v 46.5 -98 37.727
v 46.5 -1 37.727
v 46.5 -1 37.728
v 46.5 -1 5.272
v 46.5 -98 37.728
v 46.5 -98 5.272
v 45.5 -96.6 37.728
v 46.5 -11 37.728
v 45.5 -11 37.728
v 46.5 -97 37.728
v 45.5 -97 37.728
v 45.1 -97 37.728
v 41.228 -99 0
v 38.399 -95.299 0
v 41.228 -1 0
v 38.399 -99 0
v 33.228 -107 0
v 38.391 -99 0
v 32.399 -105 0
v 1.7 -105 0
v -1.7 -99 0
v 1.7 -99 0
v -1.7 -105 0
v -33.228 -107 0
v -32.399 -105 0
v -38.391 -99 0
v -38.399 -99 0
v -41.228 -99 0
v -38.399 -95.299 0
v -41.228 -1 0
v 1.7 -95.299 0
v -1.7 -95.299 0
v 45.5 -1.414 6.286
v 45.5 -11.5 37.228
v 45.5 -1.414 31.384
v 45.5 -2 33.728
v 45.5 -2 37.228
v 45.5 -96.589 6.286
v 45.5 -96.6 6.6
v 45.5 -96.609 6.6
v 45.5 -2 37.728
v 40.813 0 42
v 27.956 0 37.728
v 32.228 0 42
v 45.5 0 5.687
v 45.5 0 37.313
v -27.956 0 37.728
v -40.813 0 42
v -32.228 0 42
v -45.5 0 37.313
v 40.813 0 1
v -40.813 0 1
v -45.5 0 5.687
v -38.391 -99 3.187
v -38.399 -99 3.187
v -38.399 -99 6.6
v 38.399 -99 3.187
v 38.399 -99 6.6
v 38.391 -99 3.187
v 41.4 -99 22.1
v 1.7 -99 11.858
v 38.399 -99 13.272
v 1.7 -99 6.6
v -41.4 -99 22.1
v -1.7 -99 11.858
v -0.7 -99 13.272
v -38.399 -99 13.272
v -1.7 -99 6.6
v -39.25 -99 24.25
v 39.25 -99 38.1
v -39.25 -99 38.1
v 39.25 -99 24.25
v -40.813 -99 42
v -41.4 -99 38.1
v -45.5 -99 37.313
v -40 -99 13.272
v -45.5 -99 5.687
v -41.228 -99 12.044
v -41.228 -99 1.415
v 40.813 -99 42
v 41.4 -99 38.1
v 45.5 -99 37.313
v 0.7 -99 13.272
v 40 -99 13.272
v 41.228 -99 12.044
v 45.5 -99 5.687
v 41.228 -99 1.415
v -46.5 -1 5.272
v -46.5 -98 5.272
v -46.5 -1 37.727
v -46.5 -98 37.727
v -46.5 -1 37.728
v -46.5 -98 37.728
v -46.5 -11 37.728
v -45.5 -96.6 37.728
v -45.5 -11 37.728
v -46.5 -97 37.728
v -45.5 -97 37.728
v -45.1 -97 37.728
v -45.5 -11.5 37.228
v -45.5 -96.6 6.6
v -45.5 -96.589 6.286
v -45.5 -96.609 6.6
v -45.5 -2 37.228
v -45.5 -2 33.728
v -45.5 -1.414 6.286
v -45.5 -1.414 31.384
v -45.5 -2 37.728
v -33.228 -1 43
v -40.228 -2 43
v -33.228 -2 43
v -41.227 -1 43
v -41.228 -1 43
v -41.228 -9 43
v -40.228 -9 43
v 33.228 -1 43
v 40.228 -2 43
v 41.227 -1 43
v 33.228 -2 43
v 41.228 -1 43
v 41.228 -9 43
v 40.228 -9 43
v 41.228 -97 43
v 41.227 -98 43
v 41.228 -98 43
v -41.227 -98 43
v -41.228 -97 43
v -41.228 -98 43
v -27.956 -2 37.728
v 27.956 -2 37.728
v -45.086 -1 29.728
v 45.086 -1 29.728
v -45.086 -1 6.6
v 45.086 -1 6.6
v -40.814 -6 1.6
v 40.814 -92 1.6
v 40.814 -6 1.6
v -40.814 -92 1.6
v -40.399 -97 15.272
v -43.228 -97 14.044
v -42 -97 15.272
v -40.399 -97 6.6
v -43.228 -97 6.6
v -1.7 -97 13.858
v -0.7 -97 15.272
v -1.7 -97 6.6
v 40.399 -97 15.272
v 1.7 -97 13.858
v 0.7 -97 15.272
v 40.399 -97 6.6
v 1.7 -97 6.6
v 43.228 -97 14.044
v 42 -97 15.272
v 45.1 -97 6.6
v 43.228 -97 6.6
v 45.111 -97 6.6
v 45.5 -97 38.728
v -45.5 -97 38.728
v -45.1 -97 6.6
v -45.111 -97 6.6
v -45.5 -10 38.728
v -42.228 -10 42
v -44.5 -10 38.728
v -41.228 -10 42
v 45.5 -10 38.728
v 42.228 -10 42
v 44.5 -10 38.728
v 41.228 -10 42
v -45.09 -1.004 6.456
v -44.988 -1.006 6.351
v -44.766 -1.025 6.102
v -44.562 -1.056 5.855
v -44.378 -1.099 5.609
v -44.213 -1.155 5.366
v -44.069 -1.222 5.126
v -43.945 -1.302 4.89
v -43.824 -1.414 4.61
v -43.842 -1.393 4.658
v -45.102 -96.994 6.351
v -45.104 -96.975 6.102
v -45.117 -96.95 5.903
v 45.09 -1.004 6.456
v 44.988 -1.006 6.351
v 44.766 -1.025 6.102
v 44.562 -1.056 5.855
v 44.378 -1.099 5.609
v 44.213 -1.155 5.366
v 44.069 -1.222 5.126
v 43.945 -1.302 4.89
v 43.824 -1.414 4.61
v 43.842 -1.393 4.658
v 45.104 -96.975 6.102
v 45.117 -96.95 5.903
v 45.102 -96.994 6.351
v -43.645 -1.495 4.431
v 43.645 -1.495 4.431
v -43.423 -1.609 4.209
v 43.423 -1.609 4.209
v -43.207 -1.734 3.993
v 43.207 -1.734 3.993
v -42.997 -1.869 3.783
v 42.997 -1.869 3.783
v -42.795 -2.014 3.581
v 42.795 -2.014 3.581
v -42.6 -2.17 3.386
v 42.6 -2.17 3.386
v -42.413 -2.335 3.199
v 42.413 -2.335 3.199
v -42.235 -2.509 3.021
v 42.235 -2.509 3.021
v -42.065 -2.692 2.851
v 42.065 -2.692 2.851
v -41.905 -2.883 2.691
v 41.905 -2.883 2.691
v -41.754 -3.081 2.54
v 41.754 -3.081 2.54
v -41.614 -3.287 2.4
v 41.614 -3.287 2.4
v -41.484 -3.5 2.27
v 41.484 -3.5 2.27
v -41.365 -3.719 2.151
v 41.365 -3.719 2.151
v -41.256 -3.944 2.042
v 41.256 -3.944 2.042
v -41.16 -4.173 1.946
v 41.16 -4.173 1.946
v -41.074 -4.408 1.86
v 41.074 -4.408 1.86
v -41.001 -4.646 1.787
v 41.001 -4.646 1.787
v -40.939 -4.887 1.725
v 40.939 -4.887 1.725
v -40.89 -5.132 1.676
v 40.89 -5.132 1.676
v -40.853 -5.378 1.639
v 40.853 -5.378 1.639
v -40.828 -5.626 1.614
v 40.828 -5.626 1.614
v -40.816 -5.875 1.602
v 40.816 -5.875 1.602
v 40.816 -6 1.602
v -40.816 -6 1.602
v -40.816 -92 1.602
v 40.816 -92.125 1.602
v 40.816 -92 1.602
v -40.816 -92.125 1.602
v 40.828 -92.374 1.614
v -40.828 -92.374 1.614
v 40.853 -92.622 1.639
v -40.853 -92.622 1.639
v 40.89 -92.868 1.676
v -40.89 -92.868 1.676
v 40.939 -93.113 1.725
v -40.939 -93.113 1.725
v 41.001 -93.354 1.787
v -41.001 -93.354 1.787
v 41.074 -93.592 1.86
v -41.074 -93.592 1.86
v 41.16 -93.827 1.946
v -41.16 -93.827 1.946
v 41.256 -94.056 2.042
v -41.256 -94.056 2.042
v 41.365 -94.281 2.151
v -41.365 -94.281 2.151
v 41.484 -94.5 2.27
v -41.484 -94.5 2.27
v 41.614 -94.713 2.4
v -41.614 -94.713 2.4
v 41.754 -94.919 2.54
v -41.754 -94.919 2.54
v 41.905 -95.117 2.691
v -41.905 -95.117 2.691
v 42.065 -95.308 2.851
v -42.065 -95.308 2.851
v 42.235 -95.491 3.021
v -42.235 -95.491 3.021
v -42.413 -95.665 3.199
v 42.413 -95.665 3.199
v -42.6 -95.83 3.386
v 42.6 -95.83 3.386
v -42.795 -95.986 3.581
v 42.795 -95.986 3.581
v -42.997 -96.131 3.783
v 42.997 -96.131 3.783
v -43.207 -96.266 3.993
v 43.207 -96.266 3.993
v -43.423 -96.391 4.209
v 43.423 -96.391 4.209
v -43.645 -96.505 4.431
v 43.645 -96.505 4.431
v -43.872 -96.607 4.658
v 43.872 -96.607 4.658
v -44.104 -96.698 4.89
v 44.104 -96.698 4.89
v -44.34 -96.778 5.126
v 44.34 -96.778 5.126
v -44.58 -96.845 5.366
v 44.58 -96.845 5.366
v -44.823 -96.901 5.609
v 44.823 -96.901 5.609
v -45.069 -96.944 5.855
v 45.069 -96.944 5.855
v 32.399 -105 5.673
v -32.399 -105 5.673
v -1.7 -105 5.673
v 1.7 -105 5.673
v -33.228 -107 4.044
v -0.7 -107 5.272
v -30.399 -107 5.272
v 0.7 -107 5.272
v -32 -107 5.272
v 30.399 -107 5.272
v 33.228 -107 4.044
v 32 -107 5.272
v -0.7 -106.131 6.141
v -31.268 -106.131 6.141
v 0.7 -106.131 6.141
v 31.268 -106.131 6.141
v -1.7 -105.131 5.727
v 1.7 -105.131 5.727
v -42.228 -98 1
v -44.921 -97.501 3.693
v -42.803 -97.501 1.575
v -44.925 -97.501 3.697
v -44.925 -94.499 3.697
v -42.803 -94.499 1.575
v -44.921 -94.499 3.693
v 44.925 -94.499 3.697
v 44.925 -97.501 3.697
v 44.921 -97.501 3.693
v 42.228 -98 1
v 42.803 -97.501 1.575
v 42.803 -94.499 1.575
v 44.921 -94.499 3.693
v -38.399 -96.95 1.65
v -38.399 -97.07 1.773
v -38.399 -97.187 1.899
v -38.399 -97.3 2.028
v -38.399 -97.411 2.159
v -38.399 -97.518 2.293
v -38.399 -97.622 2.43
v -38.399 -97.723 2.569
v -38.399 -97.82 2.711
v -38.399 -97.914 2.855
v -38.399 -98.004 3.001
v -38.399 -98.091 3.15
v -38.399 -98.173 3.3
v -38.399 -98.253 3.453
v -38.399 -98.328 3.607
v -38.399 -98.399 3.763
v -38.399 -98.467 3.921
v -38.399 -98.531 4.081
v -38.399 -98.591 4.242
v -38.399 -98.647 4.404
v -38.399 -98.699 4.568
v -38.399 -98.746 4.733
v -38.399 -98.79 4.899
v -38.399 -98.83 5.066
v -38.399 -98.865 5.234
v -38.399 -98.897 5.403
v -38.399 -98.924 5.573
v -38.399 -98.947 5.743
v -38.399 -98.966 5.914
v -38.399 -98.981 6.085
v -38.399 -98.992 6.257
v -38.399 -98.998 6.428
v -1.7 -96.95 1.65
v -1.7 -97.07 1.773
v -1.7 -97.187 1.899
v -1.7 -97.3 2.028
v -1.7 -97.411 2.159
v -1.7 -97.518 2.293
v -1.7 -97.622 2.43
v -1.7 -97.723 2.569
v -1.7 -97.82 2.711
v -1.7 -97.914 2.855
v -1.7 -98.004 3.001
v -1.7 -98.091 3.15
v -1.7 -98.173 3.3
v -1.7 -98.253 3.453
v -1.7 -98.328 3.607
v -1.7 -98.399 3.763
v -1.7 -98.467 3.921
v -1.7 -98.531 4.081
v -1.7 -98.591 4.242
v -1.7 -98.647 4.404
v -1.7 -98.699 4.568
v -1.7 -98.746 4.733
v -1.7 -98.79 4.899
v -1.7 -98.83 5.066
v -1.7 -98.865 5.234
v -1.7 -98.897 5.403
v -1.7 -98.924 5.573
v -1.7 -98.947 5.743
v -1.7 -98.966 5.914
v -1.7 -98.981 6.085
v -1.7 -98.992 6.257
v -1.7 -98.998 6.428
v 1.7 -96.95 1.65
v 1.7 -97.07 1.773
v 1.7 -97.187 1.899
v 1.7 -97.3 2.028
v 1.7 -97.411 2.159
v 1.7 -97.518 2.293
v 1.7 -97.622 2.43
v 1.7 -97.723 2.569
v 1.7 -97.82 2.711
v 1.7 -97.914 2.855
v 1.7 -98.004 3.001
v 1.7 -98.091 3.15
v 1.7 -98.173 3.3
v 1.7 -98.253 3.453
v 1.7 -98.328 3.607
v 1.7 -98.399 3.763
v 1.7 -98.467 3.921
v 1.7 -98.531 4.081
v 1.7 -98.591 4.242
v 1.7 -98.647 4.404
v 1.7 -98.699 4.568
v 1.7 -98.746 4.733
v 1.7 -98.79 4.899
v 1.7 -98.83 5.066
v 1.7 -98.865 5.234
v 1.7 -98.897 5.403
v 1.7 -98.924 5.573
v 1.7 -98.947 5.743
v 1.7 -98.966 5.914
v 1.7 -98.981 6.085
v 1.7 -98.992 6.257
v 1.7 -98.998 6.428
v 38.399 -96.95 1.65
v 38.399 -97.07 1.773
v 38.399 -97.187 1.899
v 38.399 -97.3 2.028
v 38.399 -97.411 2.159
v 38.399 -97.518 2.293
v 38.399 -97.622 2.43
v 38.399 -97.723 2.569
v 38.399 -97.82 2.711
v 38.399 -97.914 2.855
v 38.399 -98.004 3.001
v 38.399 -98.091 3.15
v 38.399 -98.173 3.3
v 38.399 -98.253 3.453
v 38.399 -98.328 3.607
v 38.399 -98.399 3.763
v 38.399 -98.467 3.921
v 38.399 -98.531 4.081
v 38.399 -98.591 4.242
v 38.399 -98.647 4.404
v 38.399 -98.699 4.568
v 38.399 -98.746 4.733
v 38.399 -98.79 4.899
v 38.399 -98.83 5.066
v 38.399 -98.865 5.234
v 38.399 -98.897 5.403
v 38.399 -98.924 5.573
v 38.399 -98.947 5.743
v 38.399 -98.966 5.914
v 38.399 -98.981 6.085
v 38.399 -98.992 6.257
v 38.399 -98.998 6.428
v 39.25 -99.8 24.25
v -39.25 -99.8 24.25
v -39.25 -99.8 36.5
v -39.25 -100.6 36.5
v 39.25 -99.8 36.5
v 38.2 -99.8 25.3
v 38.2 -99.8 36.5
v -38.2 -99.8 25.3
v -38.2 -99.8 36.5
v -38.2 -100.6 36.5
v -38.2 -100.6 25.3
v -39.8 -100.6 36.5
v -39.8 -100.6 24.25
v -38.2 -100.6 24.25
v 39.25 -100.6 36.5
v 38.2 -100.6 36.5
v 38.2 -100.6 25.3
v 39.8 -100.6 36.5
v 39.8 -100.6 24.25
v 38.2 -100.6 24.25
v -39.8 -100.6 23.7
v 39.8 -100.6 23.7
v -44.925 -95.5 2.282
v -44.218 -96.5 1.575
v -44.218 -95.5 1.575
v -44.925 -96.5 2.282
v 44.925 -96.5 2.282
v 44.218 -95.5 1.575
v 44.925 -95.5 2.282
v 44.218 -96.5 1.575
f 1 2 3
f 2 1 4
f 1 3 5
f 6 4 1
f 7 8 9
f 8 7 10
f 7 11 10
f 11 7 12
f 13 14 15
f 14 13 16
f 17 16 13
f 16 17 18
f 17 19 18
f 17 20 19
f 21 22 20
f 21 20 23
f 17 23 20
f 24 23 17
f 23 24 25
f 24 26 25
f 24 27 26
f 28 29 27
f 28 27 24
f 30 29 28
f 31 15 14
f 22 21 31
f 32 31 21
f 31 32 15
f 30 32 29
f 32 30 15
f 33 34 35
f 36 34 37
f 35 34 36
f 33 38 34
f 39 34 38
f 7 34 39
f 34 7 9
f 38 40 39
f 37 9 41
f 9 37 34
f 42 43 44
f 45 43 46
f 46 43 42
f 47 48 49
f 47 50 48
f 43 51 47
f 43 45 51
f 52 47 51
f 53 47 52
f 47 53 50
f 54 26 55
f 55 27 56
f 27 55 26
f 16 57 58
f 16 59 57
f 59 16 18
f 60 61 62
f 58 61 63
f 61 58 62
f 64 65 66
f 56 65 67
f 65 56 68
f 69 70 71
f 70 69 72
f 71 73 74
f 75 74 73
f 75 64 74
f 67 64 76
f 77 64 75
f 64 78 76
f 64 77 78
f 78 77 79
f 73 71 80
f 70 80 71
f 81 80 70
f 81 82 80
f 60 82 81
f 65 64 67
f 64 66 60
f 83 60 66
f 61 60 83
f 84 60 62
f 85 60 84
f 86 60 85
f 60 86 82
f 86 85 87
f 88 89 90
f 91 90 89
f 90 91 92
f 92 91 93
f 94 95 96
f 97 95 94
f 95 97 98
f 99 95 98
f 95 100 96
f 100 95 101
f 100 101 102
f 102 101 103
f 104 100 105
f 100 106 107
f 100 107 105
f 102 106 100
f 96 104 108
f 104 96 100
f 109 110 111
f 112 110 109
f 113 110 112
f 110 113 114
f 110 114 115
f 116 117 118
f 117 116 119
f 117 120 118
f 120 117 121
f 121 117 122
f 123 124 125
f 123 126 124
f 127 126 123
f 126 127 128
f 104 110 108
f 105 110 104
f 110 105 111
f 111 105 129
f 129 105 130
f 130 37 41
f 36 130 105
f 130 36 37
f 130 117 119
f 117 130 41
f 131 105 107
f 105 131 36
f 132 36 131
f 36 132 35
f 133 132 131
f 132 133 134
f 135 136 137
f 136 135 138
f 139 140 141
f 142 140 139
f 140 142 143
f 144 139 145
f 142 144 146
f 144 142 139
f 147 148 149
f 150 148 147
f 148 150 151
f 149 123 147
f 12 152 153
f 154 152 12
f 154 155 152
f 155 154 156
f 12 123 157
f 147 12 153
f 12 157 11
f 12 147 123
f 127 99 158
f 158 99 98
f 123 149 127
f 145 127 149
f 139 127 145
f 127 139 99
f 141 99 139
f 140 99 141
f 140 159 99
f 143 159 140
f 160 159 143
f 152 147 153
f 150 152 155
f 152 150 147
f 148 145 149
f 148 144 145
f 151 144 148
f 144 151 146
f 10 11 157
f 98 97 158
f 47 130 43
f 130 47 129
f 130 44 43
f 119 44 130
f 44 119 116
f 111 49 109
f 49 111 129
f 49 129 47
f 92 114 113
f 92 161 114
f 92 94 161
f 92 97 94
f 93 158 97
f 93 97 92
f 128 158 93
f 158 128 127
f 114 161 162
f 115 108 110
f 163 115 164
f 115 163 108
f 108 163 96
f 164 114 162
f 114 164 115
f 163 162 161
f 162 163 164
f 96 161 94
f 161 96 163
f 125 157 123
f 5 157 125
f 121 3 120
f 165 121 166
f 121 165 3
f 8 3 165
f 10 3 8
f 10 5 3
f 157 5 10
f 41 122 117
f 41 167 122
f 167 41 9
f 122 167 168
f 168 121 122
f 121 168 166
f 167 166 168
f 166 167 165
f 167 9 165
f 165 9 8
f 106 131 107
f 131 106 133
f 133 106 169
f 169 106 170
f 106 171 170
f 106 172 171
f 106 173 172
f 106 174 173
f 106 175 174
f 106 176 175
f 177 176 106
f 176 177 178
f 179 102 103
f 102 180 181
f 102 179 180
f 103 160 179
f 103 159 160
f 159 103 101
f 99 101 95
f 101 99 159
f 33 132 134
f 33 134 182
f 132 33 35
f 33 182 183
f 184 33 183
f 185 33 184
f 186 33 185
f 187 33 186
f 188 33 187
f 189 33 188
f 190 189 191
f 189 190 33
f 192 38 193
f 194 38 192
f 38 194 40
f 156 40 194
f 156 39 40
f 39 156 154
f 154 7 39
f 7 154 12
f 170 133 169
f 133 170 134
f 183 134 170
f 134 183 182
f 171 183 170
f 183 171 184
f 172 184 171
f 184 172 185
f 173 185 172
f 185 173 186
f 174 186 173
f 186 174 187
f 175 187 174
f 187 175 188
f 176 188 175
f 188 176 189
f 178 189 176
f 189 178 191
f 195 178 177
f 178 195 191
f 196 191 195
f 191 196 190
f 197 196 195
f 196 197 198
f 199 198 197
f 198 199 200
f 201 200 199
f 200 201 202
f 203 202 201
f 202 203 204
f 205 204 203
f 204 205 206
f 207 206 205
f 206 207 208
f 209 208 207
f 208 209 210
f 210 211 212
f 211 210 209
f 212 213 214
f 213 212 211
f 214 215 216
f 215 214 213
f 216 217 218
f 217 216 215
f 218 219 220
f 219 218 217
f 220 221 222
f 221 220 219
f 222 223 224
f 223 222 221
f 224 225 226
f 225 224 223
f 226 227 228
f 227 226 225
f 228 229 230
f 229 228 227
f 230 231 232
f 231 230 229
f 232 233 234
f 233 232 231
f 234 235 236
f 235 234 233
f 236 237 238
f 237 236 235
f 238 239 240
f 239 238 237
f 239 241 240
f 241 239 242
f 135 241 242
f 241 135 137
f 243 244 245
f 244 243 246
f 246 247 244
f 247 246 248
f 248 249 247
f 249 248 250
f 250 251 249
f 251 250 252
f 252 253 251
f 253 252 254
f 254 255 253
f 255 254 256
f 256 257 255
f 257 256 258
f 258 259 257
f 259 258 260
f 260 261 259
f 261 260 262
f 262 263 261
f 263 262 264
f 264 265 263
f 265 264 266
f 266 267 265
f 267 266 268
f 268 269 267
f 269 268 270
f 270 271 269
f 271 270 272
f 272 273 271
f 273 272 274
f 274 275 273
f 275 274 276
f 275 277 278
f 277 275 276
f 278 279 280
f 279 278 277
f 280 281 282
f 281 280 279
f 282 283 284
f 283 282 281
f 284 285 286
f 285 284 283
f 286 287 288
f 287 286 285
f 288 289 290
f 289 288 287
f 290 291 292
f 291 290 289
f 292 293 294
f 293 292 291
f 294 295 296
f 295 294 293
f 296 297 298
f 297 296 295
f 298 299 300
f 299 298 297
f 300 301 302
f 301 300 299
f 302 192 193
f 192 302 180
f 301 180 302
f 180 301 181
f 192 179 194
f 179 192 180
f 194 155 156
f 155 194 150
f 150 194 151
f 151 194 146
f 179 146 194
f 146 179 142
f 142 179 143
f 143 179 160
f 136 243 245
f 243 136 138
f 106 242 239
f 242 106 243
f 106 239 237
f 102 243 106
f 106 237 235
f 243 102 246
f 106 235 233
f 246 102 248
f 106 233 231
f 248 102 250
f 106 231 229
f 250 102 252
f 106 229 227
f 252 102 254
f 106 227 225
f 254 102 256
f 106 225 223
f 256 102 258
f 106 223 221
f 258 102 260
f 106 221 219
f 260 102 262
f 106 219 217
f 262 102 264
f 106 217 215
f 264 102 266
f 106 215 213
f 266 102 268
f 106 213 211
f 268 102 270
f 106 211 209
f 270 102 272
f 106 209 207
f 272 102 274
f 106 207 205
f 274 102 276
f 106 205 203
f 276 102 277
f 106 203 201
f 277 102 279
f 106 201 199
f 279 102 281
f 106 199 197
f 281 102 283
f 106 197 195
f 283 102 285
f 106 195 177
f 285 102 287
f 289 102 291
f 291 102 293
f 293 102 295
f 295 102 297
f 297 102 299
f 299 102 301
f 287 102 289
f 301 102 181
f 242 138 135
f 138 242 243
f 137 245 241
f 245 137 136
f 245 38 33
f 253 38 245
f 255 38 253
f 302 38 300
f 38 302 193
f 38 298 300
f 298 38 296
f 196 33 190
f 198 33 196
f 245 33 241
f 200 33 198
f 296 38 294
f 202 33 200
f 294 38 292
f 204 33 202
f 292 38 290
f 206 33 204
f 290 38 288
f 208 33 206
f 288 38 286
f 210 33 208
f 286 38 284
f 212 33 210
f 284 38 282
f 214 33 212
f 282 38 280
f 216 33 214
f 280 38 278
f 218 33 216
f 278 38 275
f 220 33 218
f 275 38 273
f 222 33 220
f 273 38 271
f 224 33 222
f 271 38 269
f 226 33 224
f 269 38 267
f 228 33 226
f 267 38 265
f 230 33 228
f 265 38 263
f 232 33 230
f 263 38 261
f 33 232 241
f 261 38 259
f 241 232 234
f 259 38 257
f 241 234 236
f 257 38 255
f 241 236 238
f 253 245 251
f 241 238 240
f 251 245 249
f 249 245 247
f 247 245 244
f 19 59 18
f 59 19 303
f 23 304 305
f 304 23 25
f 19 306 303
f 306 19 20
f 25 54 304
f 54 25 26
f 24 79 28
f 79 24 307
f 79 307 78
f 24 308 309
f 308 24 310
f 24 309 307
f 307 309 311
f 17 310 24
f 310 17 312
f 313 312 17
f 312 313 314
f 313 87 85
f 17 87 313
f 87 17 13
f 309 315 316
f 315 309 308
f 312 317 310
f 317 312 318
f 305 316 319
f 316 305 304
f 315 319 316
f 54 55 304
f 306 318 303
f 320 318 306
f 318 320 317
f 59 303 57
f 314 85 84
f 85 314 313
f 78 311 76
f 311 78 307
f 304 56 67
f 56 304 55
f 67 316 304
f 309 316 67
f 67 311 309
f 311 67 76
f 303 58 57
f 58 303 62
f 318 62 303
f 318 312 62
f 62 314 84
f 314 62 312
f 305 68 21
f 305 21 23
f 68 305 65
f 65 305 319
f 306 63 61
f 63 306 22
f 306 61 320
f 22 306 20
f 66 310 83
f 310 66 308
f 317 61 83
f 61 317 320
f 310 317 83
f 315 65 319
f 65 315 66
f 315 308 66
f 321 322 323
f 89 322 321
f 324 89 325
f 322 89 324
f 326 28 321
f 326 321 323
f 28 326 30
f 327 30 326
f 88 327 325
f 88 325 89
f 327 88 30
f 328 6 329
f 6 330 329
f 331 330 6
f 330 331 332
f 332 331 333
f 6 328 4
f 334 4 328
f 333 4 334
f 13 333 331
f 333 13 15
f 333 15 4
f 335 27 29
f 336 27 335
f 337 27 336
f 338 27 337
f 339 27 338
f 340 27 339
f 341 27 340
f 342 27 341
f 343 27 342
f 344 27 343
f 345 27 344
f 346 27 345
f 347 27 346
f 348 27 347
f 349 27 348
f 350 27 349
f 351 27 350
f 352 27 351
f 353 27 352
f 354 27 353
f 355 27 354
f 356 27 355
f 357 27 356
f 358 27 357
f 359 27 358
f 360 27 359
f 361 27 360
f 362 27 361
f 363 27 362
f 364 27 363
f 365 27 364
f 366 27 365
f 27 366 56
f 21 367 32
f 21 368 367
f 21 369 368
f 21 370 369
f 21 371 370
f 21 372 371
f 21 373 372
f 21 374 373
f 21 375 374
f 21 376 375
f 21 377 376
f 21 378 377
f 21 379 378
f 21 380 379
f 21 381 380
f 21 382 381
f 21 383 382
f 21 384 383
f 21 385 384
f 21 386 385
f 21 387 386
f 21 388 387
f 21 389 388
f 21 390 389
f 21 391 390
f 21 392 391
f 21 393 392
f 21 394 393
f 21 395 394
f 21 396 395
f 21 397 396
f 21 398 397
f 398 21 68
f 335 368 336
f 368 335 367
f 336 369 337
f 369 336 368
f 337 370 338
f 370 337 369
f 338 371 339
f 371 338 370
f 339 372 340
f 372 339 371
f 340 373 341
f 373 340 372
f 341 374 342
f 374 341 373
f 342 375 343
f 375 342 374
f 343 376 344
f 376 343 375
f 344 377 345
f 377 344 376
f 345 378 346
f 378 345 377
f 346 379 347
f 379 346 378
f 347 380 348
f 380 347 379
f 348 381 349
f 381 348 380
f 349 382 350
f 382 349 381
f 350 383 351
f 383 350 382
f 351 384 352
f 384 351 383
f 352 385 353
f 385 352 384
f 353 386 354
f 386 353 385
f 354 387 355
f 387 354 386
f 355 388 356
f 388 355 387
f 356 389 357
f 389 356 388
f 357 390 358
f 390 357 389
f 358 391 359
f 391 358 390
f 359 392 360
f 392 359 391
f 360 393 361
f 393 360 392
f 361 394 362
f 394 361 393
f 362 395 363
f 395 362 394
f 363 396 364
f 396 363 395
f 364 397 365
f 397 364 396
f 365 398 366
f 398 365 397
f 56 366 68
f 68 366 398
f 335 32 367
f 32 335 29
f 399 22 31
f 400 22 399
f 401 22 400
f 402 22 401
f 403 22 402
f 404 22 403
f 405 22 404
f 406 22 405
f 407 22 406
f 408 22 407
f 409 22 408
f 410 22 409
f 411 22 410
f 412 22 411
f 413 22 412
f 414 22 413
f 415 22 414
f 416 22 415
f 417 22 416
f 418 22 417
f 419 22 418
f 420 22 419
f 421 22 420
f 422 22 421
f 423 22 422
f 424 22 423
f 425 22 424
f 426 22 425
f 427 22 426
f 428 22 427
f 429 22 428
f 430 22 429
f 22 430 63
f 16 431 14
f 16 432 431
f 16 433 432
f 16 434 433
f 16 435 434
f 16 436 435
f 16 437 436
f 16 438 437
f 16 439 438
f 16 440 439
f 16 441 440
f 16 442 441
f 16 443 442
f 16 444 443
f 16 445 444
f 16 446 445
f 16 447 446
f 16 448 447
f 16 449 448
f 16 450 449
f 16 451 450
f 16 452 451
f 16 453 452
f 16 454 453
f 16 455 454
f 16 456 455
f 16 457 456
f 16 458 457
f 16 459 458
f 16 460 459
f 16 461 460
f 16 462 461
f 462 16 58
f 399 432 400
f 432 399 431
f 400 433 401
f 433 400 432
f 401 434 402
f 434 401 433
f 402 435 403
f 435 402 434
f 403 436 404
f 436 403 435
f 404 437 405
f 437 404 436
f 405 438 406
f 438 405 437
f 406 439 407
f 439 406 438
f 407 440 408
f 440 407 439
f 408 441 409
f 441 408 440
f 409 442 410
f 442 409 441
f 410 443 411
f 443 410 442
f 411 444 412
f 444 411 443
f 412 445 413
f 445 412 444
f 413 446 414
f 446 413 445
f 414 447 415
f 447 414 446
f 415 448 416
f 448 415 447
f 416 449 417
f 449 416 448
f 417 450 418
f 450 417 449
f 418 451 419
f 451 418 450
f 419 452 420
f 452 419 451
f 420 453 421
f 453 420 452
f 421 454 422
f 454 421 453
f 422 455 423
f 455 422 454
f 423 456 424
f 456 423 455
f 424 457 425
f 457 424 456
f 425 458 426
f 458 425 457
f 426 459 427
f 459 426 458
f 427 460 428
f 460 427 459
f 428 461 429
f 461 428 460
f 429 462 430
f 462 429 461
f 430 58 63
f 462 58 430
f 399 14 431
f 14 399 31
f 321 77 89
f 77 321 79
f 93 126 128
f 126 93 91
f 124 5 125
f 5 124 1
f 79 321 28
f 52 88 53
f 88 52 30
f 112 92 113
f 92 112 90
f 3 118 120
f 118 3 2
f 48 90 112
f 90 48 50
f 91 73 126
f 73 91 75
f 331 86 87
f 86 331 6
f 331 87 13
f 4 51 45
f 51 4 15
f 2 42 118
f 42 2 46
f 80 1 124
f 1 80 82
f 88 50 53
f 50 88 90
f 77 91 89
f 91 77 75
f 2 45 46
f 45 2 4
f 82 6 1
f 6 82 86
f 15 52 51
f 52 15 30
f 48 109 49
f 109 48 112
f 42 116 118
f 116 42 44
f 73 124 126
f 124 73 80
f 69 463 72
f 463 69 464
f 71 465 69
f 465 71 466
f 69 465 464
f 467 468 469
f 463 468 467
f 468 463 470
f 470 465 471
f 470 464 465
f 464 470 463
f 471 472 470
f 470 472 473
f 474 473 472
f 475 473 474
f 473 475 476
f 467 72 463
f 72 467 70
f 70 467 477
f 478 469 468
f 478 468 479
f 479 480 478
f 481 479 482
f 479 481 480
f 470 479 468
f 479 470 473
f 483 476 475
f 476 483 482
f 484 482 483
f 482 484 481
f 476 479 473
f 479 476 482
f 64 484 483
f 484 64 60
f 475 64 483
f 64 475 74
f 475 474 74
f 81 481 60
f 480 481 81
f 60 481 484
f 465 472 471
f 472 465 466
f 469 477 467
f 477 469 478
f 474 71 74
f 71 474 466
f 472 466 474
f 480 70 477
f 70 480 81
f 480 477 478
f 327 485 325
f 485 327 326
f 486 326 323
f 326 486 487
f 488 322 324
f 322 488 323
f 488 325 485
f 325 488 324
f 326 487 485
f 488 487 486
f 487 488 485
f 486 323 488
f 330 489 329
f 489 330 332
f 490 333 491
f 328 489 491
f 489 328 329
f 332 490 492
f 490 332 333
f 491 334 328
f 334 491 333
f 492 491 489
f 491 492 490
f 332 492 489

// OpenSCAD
// MultiBin Simple Drawer - parametric remake
// Reverse-engineered from MultiBoard's official "MultiBin Simple Drawer" STLs so that
// matching configurations reproduce the originals; every other configuration follows
// the same rules (50 mm grid per LU, identical wall, lip, label, scoop and magnet
// geometry). Paste this whole file into MakerWorld's Parametric Model Maker.
//
// Drawer orientation: X = width, Y = depth (front toward -Y), Z = height.
// Centered on X; back face at Y = 0; base at Z = 0.

/* [Size (in 50 mm layout units)] */
// Drawer width in LU
width_lu = 2; // [1:0.5:12]
// Drawer depth in LU
depth_lu = 2; // [1:0.5:12]
// Drawer height in LU
height_lu = 1; // [0.5:0.5:12]

/* [Compartments] */
// Number of width-wise sections (columns)
width_sections = 1; // [1:12]
// Number of depth-wise sections (rows)
depth_sections = 1; // [1:12]
// Relative widths of the columns, left to right as you face the label, such as 2,1,1. Blank means equal
width_ratios = "";
// Relative depths of the rows, front to back, such as 1,2. Blank means equal
depth_ratios = "";
// Divider height in LU (clamped to the wall height)
divider_height_lu = 12; // [0.5:0.5:12]
// Divider thickness in mm
divider_thickness = 1.0; // [0.6:0.1:4]
// Finger scoop in the tops of the dividers. front slopes each width divider down toward the label end; center notches every divider between crossings
divider_scoop = "none"; // [none, front, center]
// Depth of the scoop in mm (reduced where a divider is too low or a compartment too short for it)
divider_scoop_mm = 10; // [2:1:40]

/* [Features] */
// Magnet pocket(s) in the back wall (thickens the back wall to 4 mm)
magnet = false;
// Label holder on the front face
label = "large"; // [none, small, large]

/* [Hidden] */
$fs = 0.25;
$fa = 1;
eps = 0.01;
hs  = 0.0005;   // hull-slab thickness: keeps lofted faces on their nominal planes

U  = 50;                        // one layout unit
W  = max(1, width_lu);
D  = max(1, depth_lu);
H  = max(0.5, height_lu);

OW   = U*W - 7;                 // outer width
half = OW/2;
OH   = U*H - 7;                 // outer height
WT   = OH - 5.272;              // side/back wall + divider top height
F    = -(U*D - 1);              // front wall outer face (Y)
LIPF = F - 8;                   // lip plate front face (Y)

// Feature gates: the label frame and the magnet pocket both need a full layout
// unit of height; below that they are omitted (with a warning) instead of
// emitting broken geometry. Gating on the unit rather than on a millimetre
// threshold matters for heights typed in off the 0.5 step: at 0.74 LU a
// millimetre gate would still build the label frame, and it would fuse into
// the pull lip.
lab_on = (label != "none") && (H >= 1);
mag_on = magnet && (H >= 1);

floor_t   = 1.6;                // floor thickness
wall_s    = 1.0;                // side wall thickness
wall_b    = mag_on ? 4.0 : 1.0; // back wall base thickness
wall_f    = 2.0;                // front wall thickness
lean0     = WT - 8;             // back wall starts thickening to 2 mm here
lean1     = WT - 4;             // back wall reaches 2 mm here
fil_r     = 5;                  // interior floor fillet radius (front/back/dividers)
fil_cz    = floor_t + fil_r;    // fillet center height (6.6)
side_ch   = 4.686;              // interior side-wall floor chamfer leg
bot_ch    = 5.272;              // outer side bottom chamfer leg
frt_r     = 7;                  // outer front-bottom fillet radius
brace_len = min(8*H + 2, U*D - 5);  // corner brace flange length, clamped to the depth
div_t     = min(4, max(0.6, divider_thickness));   // divider thickness (1.0 on the originals)
div_top   = min(WT, U*divider_height_lu - 12.272); // divider top height

n_cells = max(1, floor(W + eps));                 // full 50 mm cells across the width
cell_c  = [for (i = [0:1:n_cells-1]) (i - (n_cells-1)/2) * U];       // cell centers
cell_b  = n_cells < 2 ? [] :
          [for (i = [0:1:n_cells-2]) (cell_c[i] + cell_c[i+1]) / 2]; // cell boundaries

n_grooves = max(0, floor((WT - 3) / U + eps));    // internal 50 mm height boundaries

// ---- compartment sizes typed as text, such as "2,1,1"
// OpenSCAD 2021.01 has no string-to-number function, so the numbers are read
// one character at a time. A list is numbers separated by commas, with spaces
// allowed around each; anything else makes the whole text unusable.
function _digit(c) = let (h = search(c, "0123456789")) len(h) == 0 ? -1 : h[0];
function _blank(s, i = 0) = i >= len(s) ? true : s[i] != " " ? false : _blank(s, i + 1);
// index of the next comma at or after i, or the end of the text
function _field_end(s, i) = i >= len(s) || s[i] == "," ? i : _field_end(s, i + 1);
// the number written in s from i up to j, or undef if that stretch is not one number
function _number(s, i, j, acc = 0, scale = 0, digits = 0, done = false) =
    i >= j ? (digits > 0 ? acc : undef) :
    let (c = s[i], d = _digit(c))
    c == " " ? _number(s, i + 1, j, acc, scale, digits, digits > 0 || scale != 0) :
    done ? undef :
    d >= 0 ? (scale == 0 ? _number(s, i + 1, j, acc*10 + d, 0, digits + 1)
                         : _number(s, i + 1, j, acc + d*scale, scale/10, digits + 1)) :
    c == "." && scale == 0 ? _number(s, i + 1, j, acc, 0.1, digits) :
    undef;
// every number of a comma-separated list, or undef if any field is not a number
function _numbers(s, i = 0, out = []) =
    let (j = _field_end(s, i), v = _number(s, i, j))
    v == undef ? undef :
    j >= len(s) ? concat(out, [v]) : _numbers(s, j + 1, concat(out, [v]));
function _sum(v, n, i = 0) = i >= n ? 0 : v[i] + _sum(v, n, i + 1);   // sum of the first n values

// The ratios for n sections from the typed text. [] means equal sections: a
// blank text, or numbers that are all the same. undef means the text is not a
// list of positive numbers. Too few numbers are padded with the last one given,
// and numbers beyond the n-th are not used.
function section_ratios(text, n) =
    _blank(text) ? [] :
    let (v = _numbers(text))
    v == undef || min(v) <= 0 ? undef :
    let (p = [for (i = [0:1:n - 1]) v[min(i, len(v) - 1)]])
    max(p) == min(p) ? [] : p;

min_cell = 2;       // a compartment narrower than this is a sliver, and is not built
cavW = (half - wall_s) - (-(half - wall_s)); // cavity width between the side walls
cavD = (-wall_b) - (F + wall_f);            // cavity depth between the front and back walls

// widths of the columns for a list of ratios ([] = equal), left to right
function width_cells(r) =
    let (usable = cavW - (width_sections - 1)*div_t)
    len(r) == 0 ? [for (i = [0:1:width_sections - 1]) usable/width_sections]
                : [for (i = [0:1:width_sections - 1]) usable*r[i]/_sum(r, width_sections)];
// Division lines of the rows for a list of ratios ([] = equal), front to back.
// The originals place each depth divider with its BACK face on its division
// line (g212 measured), so a divider takes its thickness from the row in front
// of the line, and with equal ratios every row but the back one is one divider
// thickness shorter than the back one.
function depth_lines(r) =
    let (cavB = -wall_b, cavF = F + wall_f)
    len(r) == 0 ? [for (k = [1:1:depth_sections - 1]) cavB - (depth_sections - k)*(cavD/depth_sections)]
                : [for (k = [1:1:depth_sections - 1]) cavF + cavD*_sum(r, k)/_sum(r, depth_sections)];
// clear depths of the rows, front to back
function depth_cells(r) =
    let (cavB = -wall_b, cavF = F + wall_f, y = depth_lines(r), n = depth_sections)
    [for (k = [0:1:n - 1]) (k == n - 1 ? cavB : y[k] - div_t) - (k == 0 ? cavF : y[k - 1])];

w_typed = section_ratios(width_ratios, width_sections);
d_typed = section_ratios(depth_ratios, depth_sections);
// ratios that would leave a sliver are dropped for equal sections
w_ratio = (w_typed == undef || min(width_cells(w_typed)) < min_cell) ? [] : w_typed;
d_ratio = (d_typed == undef || min(depth_cells(d_typed)) < min_cell) ? [] : d_typed;
// dividers are left out altogether when even equal sections would be slivers
w_div = width_sections > 1 && min(width_cells(w_ratio)) >= min_cell;
d_div = depth_sections > 1 && min(depth_cells(d_ratio)) >= min_cell;

if (w_typed == undef)
    echo("WARNING: width_ratios is not a list of positive numbers such as 2,1,1; using equal widths.");
else if (w_typed != w_ratio)
    echo("WARNING: width_ratios would leave a column under 2 mm wide; using equal widths.");
if (d_typed == undef)
    echo("WARNING: depth_ratios is not a list of positive numbers such as 1,2; using equal depths.");
else if (d_typed != d_ratio)
    echo("WARNING: depth_ratios would leave a row under 2 mm deep; using equal depths.");
if (width_sections > 1 && !w_div)
    echo("WARNING: the columns would be under 2 mm wide; width dividers omitted.");
if (depth_sections > 1 && !d_div)
    echo("WARNING: the rows would be under 2 mm deep; depth dividers omitted.");

// Left-hand X face of every width divider, left to right. The front-bottom
// fillet cut does not read this: it is placed from the 50 mm cell boundaries
// (deviation D5), so uneven columns do not move it.
function divider_x() =
    !w_div ? [] :
    let (cavL = -(half - wall_s), cw = width_cells(w_ratio))
    len(w_ratio) == 0 ? [for (i = [1:1:width_sections - 1]) cavL + i*cw[0] + (i - 1)*div_t]
                      : [for (i = [1:1:width_sections - 1]) cavL + _sum(cw, i) + (i - 1)*div_t];

label_cells = (lab_on && label == "large") ? min(2, n_cells) : 1;
lab_win  = 13.2  + 25*(label_cells-1);  // window half width
lab_chan = 14.25 + 25*(label_cells-1);  // card channel half width
lab_foot = 16.4  + 25*(label_cells-1);  // rail outboard half width at the wall face
lab_p    = 1.6;                         // frame protrusion in front of the wall face

if (label != "none" && !lab_on)
    echo("WARNING: the label holder needs a drawer at least 1 LU tall; label omitted.");
if (magnet && !mag_on)
    echo("WARNING: the magnet pocket needs a drawer at least 1 LU tall; magnet omitted.");
if (lab_on && label == "large" && n_cells < 2)
    echo("NOTE: large label needs a drawer at least 2 LU wide; using the 1-cell frame.");

// ------------------------------------------------------------------ helpers

// 2D polygon in the (Y,Z) plane extruded along +X from x0 to x1
module prismX(pts, x0, x1) {
    translate([x0, 0, 0]) rotate([90, 0, 90])
        linear_extrude(height = x1 - x0) polygon(pts);
}
// 2D polygon in the (X,Z) plane extruded along +Y from y0 to y1  (y0 < y1)
module prismY(pts, y0, y1) {
    translate([0, y1, 0]) rotate([90, 0, 0])
        linear_extrude(height = y1 - y0) polygon(pts);
}
// ------------------------------------------------------------------ core parts

// back wall (Y,Z) profile, including the top lean and the brace inner face
back_prof = mag_on ?
    [[0, 1], [0, OH], [-2, OH], [-4, WT], [-4, 0], [-1, 0]] :
    [[0, 1], [0, OH], [-2, OH], [-2, lean1], [-1, lean0], [-1, 0]];

module back_wall() {
    difference() {
        prismX(back_prof, -half, half);
        for (k = [1:1:n_grooves]) groove_cut(k*U);
    }
}
// the inward-jogged wall panels behind the grooves; added after the cavity cut
module groove_bumps() {
    if (!mag_on) for (k = [1:1:n_grooves]) groove_bump(k*U);
}
// (X,Z) octagon spanning x0..x1, z0..z1 with 45-degree corner chamfer legs
function oct_xz(x0, x1, z0, z1, leg) = [
    [x0, z0 + leg], [x0 + leg, z0], [x1 - leg, z0], [x1, z0 + leg],
    [x1, z1 - leg], [x1 - leg, z1], [x0 + leg, z1], [x0, z1 - leg]];

// outer groove at height zk: an octagonal recess, 1 mm deep, lofted between
// its outer-face outline and its floor outline (60-degree drafts all around)
// The 45-degree corner legs shrink with depth at 1.015 per mm (measured), the
// same law the side-wall jog windows use.
module groove_cut(zk) {
    hull() {
        prismY(oct_xz(-(half - 5), half - 5, zk - 8.5, zk + 1.5, 2.929), 0, hs);
        prismY(oct_xz(-(half - 6.732), half - 6.732, zk - 6.768, zk - 0.232, 1.914), -1 - hs, -1);
    }
}
// matching inward-jogged wall panel: the shell offset of the groove (measured)
module groove_bump(zk) {
    hull() {
        prismY(oct_xz(-(half - 4.732), half - 4.732, zk - 8.768, zk + 1.768, 3.086), -1 - hs, -1);
        prismY(oct_xz(-(half - 6.464), half - 6.464, zk - 7.036, zk + 0.036, 2.071), -2, -2 + hs);
    }
}

// side-wall jog window polygon in (Y,Z), at inset d from the outer face (d in 0..1).
// Same numbers as the back-wall groove: 60-degree drafts on every edge, and plain
// 45-degree corner chamfers with equal legs (measured from the originals).
function jog_w(zk, d) =
    let (y0 = -5 - 1.732*d,          // back edge (max y)
         y1 = F + 5 + 1.732*d,       // front edge (min y)
         zA = zk - 8.5 + 1.732*d, zB = zk + 1.5 - 1.732*d,
         leg = 2.929 - 1.015*d)
    [[y0, zA + leg], [y0 - leg, zA], [y1 + leg, zA], [y1, zA + leg],
     [y1, zB - leg], [y1 + leg, zB], [y0 - leg, zB], [y0, zB - leg]];

// one side wall (sx = +1 / -1) with its jog windows
module side_wall(sx) {
    scale([sx, 1, 1])
        difference() {
            translate([half - wall_s, F, 0]) cube([wall_s, -F, WT]);
            for (k = [1:1:n_grooves]) hull() {
                prismX(jog_w(k*U, 0), half, half + hs);
                prismX(jog_w(k*U, 1), half - 1, half - 1 + hs);
            }
        }
}
// the inward-jogged side wall panels: the shell offset of the jog window (measured).
// The back corners are 45 degrees; the front corners are cut at about 52.4 degrees
// in plan (legs 3.308 in Z against 2.550 in Y at the base), and every edge carries
// the same 60 degree draft through the 1 mm panel thickness.
function jog_in(zk, d) =
    let (y0 = -4.732 - 1.732*d,      // the whole panel sits shifted +0.268 in Y
         y1 = F + 5.268 + 1.732*d,
         zA = zk - 8.768 + 1.732*d, zB = zk + 1.768 - 1.732*d,
         leg = 3.086 - 1.015*d,
         fz  = 3.308 - 1.142*d,
         fy  = 2.550 - 0.880*d)
    [[y0, zA + leg], [y0 - leg, zA], [y1 + fy, zA], [y1, zA + fz],
     [y1, zB - fz], [y1 + fy, zB], [y0 - leg, zB], [y0, zB - leg]];
module side_jog_panels() {
    for (sx = [-1, 1]) scale([sx, 1, 1])
        for (k = [1:1:n_grooves]) hull() {
            prismX(jog_in(k*U, 0), half - 1 - hs, half - 1);
            prismX(jog_in(k*U, 1), half - 2, half - 2 + hs);
        }
}

module front_wall() { translate([-half, F, 0]) cube([OW, wall_f, OH]); }
module floor_slab() { translate([-half, F, 0]) cube([OW, -F, floor_t]); }

// back corner braces: 1 mm arm leaning 45 degrees inward, with a flange along the side
module corner_braces() {
    for (sx = [-1, 1]) scale([sx, 1, 1]) intersection() {
        // leaning band (X,Z) extruded along Y
        // The band carries a short skirt 0.5 below the wall top, running exactly on
        // the wall's own two faces. Without it the leaning faces would meet the wall
        // faces edge-on at z = WT: the surfaces touch along a line instead of
        // crossing, and CGAL answers that with duplicated facets, which leaves the
        // exported mesh non-manifold at some depth and height combinations. Running
        // the skirt coplanar with the wall merges the two into one flat face instead.
        prismY([[half - (OH + 1 - WT), OH + 1], [half, WT], [half, WT - 0.5],
                [half - wall_s, WT - 0.5], [half - wall_s, WT],
                [half - wall_s - (OH + 1 - WT), OH + 1]],
               -(brace_len + 2), 0);
        // Bounded in Y by the flange end with its 45-degree chamfers. The profile runs
        // 1 below the wall top so the leaning band above does the clipping; ending it
        // exactly on WT made the two coincide and left a knife edge there, which
        // float32 binary STL export collapses into a non-manifold sliver.
        prismX([[1, WT - 1], [1, OH + 1], [-(brace_len - 2), OH + 1], [-brace_len, OH - 1],
                [-brace_len, WT + 1], [-(brace_len + 2), WT - 1]], 0, half);
    }
}

// ------------------------------------------------------------------ cutters

module cavity() {
    mainB = mag_on ? -4 : -2;   // rear boundary of the main cavity box
    translate([-(half - wall_s), F + wall_f, floor_t])
        cube([OW - 2*wall_s, -(F + wall_f) + mainB, OH + 10 - floor_t]);
    if (!mag_on) {
        translate([-(half - wall_s), -2, floor_t])
            cube([OW - 2*wall_s, 1, lean0 - floor_t]);
        prismX([[-1, lean0], [-2, lean1], [-2, lean0]],
               -(half - wall_s), half - wall_s);
    }
}
// solid fillet bar along X at wall face y = yw, bulging toward dir (re-added after cavity)
module fillet_barX(x0, x1, yw, dir) {
    translate([x0, yw, 0]) rotate([90, 0, 90]) linear_extrude(height = x1 - x0)
        difference() {
            polygon([[0, floor_t], [dir*fil_r, floor_t], [dir*fil_r, fil_cz], [0, fil_cz]]);
            translate([dir*fil_r, fil_cz]) circle(r = fil_r);
        }
}

// Back-wall finger scoop. On every original the flat ends 18.544 short of the side
// wall, which for whole-LU widths is identical to the outer cell centres +/-2.956.
// Driving it from the half-width instead reproduces those exactly and keeps the
// same shoulder on half-LU widths, where cell centres alone would leave the scoop
// 12.5 too narrow at each end.
module scoop_cut() {
    x1 = half - 18.544; x0 = -x1;
    rise = OH - WT + 2;
    prismY([[x0, WT], [x1, WT], [x1 + rise, WT + rise], [x0 - rise, WT + rise]], -7, 1);
}

module outer_edge_cuts() {
    // side bottom chamfers (5.272 legs)
    for (sx = [-1, 1]) scale([sx, 1, 1])
        prismY([[half - bot_ch - 1, -1], [half + 2, -1], [half + 2, bot_ch + 3], [half, bot_ch]],
               F - eps, eps);
    // back bottom chamfer (1)
    prismX([[0, 1], [2, 1], [2, -1], [-1, -1], [-1, 0]], -half - 1, half + 1);
    // Front bottom: 45-degree lead + r7 fillet across the finger-slot span, stopping
    // at the lip-gusset bands. Measured on the originals: the cut boundary follows
    // the gusset bands only, never the divider positions, so where a divider
    // overhangs its gusset the cut passes through it (see DEVIATIONS.md D5). At the
    // front wall's inner face the arc sits at z 1.701, so it takes about 0.1 off the
    // divider foot there and nothing deeper in.
    fb_stops = concat([-(half - 8.101)],
                      [for (b = cell_b) each [b - 1.7, b + 1.7]],
                      [half - 8.101]);
    for (i = [0:1:len(fb_stops)/2 - 1])
        prismX(front_bottom_cut(), fb_stops[2*i], fb_stops[2*i + 1]);
    // tilted hip chamfers where the 1 mm edge chamfers cross the 45-degree corner zones
    hip_cuts();
    // vertical corner chamfers (1 mm legs) at back and front-wall corners;
    // each cutter is a big triangle whose hypotenuse lies exactly on the chamfer face
    for (sx = [-1, 1]) scale([sx, 1, 1]) {
        translate([0, 0, -1]) linear_extrude(height = OH + 2)
            polygon([[half - 5, 4], [half + 8, 4], [half + 8, -9]]);
        translate([0, 0, -1]) linear_extrude(height = OH + 2)
            polygon([[half - 5, F - 4], [half + 8, F - 4], [half + 8, F + 9]]);
    }
    // top outer 1 mm chamfers: back wall edge (y=0) and front wall edge (y=F)
    prismX([[2, OH - 3], [2, OH + 3], [-1, OH + 3], [-1, OH], [0, OH - 1]], -half - 1, half + 1);
    prismX([[F - 3, OH + 3], [F - 3, OH - 3], [F, OH - 1], [F + 1, OH], [F + 1, OH + 3]],
           -half - 1, half + 1);
    // top corner chamfers (5.272 legs), full depth: front wall, back wall and braces
    for (sx = [-1, 1]) scale([sx, 1, 1])
        prismY([[half - bot_ch - 2, OH + 2], [half + 3, WT - 3], [half + 3, OH + 2]],
               F - 1, 1);
    // everything above OH
    translate([-half - 2, LIPF - 4, OH]) cube([OW + 4, -LIPF + 8, 10]);
}
function front_bottom_cut() =
    let (n = 32)
    concat([[F + 4.701, -1]],
           [for (i = [0:n]) let (a = -135 - i*45/n)
                [F + frt_r + frt_r*cos(a), fil_cz + frt_r*sin(a)]],
           [[F, -1]]);

// 1 mm corner-edge chamfers, tilted along the slanted corner edges of the
// bottom side chamfers and the top corner chamfers (normals (1,+/-2,1)/sqrt(6) family)
module hip_cuts() {
    ub = 0.7071 * (half - bot_ch);   // bottom corner edge, in the rotated frame
    ut = 0.7071 * (half + WT);       // top corner edge
    for (sx = [-1, 1]) scale([sx, 1, 1]) {
        // bottom edges run along (1,0,1); clipped at the wall faces, and at the
        // front also to outboard of the lip wing (which merges with no chamfer)
        intersection() {
            rotate([0, 45, 0]) linear_extrude(height = 2000, center = true)
                polygon([[ub - 1, F], [ub, F + 1], [ub + 9, F + 1], [ub + 9, F]]);
            translate([0, 0, -1]) linear_extrude(height = 20)
                polygon([[half - bot_ch, F], [half - bot_ch + 12, F + 12], [half + 20, F + 12],
                         [half + 20, F - 9], [half - bot_ch - 9, F - 9]]);
        }
        rotate([0, 45, 0]) linear_extrude(height = 2000, center = true)
            polygon([[ub - 1, 0], [ub, -1], [ub + 9, -1], [ub + 9, 0]]);
        // top edges run along (-1,0,1)
        rotate([0, -45, 0]) linear_extrude(height = 2000, center = true) {
            polygon([[ut - 1, F], [ut, F + 1], [ut + 9, F + 1], [ut + 9, F]]);
            polygon([[ut - 1, 0], [ut, -1], [ut + 9, -1], [ut + 9, 0]]);
        }
    }
}

// magnet pocket, one per cell center, cut into the back wall from y = 0
module magnet_pockets() { for (c = cell_c) translate([c, 0, 0]) magnet_pocket(); }
module magnet_pocket() {
    lower0 = [[-3.521, 7], [3.521, 7], [8.5, 11.979], [8.5, 19.021 + hs],
              [-8.5, 19.021 + hs], [-8.5, 11.979]];
    lower1 = [[-3.121, 6.6], [3.121, 6.6], [8.5, 11.979], [8.5, 19.021 + hs],
              [-8.5, 19.021 + hs], [-8.5, 11.979]];
    // upper region, split into two convex pieces so each 45-degree flare is exact:
    // A: shoulder wedge under the fixed 45-degree lines (shrinks with depth)
    A0  = [[-8.5, 19.021], [8.5, 19.021], [5.6, 21.921], [-5.6, 21.921]];
    A29 = [[-8.5, 19.021], [8.5, 19.021], [8.5, 19.022], [-8.5, 19.022]];
    // W: waist and top: constant for the first 0.4, then flaring 45 degrees
    W04 = [[-6.0, 21.521], [6.0, 21.521], [6.0, 23.986], [2.486, 27.5], [-2.486, 27.5], [-6.0, 23.986]];
    W29 = [[-8.5, 19.02], [8.5, 19.02], [8.5, 25.021], [3.521, 30], [-3.521, 30], [-8.5, 25.021]];
    prismY(lower0, -3.2, 1);                                  // straight entry body
    hull() { prismY(lower0, -1.8 - hs, -1.8); prismY(lower1, -2.2, -2.2 + hs); }
    prismY(lower1, -3.2, -2.2);
    prismY(A0, 0, 1);
    hull() { prismY(A0, 0, hs); prismY(A29, -2.9 - hs, -2.9); }
    prismY(W04, -0.4, 1);
    hull() { prismY(W04, -0.4 - hs, -0.4); prismY(W29, -2.9, -2.9 + hs); }
    prismY(W29, -3.2, -2.9);
}

// ------------------------------------------------------------------ interior adds

module floor_blends() {
    intersection() {
        union() {
            fillet_barX(-(half - wall_s), half - wall_s, -wall_b, -1);
            fillet_barX(-(half - wall_s), half - wall_s, F + wall_f, 1);
            prismY([[-(half - wall_s), fil_cz - fil_r + side_ch], [-(half - wall_s), floor_t],
                    [-(half - wall_s) + side_ch, floor_t]], F + wall_f, -wall_b);
            prismY([[half - wall_s, fil_cz - fil_r + side_ch], [half - wall_s, floor_t],
                    [half - wall_s - side_ch, floor_t]], F + wall_f, -wall_b);
            // small vertical chamfers in the cavity corners (0.414 back, 0.4 front legs),
            // fading out toward the floor blends below z = 6.6;
            // the thick magnetic back wall has square corners in the originals
            for (sx = [-1, 1]) scale([sx, 1, 1]) {
                // Back corner: the 0.414-leg chamfer web runs to the wall top, and its
                // bottom is cut off by the fade plane (normal (0.5, 0.7071, -0.5)
                // through the outer corner at z 6.286), below which the floor blends
                // take over. Both are measured off the originals.
                if (!mag_on) {
                    intersection() {   // the chamfer web, its foot cut by the fade plane
                        linear_extrude(height = WT)
                            polygon([[half - wall_s + 0.5, -wall_b + 0.5],
                                     [half - wall_s - 0.914, -wall_b + 0.5],
                                     [half - wall_s + 0.5, -wall_b - 0.914]]);
                        below_plane([half - wall_s, -wall_b - 0.414, 6.286],
                                    [0.5, 0.7071, -0.5], [0.7071, 0, 0.7071], [0.5, -0.7071, -0.5]);
                    }
                    intersection() {   // and the square corner fill beneath that plane
                        below_plane([half - wall_s, -wall_b - 0.414, 6.286],
                                    [-0.5, -0.7071, 0.5], [0.7071, 0, 0.7071], [-0.5, 0.7071, 0.5]);
                        translate([half - wall_s - 3.4, -wall_b - 3.4, 3.8])
                            cube([3.4 + 1, 3.4 + 1, 3.2]);
                    }
                }
                // Front corner: a 0.4-leg web above z 6.6 with a near-vertical fade
                // band below it (the originals twist this face slightly as it descends).
                translate([0, 0, fil_cz]) linear_extrude(height = WT - fil_cz)
                    polygon([[half - wall_s + 0.5, F + wall_f - 0.5],
                             [half - wall_s - 0.9, F + wall_f - 0.5],
                             [half - wall_s + 0.5, F + wall_f + 0.9]]);
                intersection() {
                    below_plane([half - wall_s, F + 2.411, 6.286], [-0.708, 0.704, 0.045],
                                [0.704, 0.708, 0], [-0.03186, 0.03168, -0.99688]);
                    translate([half - wall_s - 1.6, F + wall_f - 1, 5.6])
                        cube([1.6 + 1, 1 + 2.4, 1.02]);
                }
            }
        }
        translate([-half, F, 0]) cube([OW, -F, OH]);
    }
}

module dividers() {
    cavL = -(half - wall_s); cavR = half - wall_s;
    cavB = -wall_b; cavF = F + wall_f;
    // everything is clipped to the cavity so fillet bars cannot escape the walls
    intersection() {
    translate([cavL, cavF, 0]) cube([cavR - cavL, cavB - cavF, OH]);
    difference() {
    union() {
    if (w_div) {
        for (xl = divider_x()) {
            translate([xl, cavF, 0]) cube([div_t, cavB - cavF, div_top]);
            translate([xl, 0, 0])         divider_filletY(cavF, cavB, -1);
            translate([xl + div_t, 0, 0]) divider_filletY(cavF, cavB, 1);
            // end flares; at the back they follow the wall as it leans to 2 mm
            translate([xl + div_t/2, cavF, 0]) linear_extrude(height = div_top)
                polygon([[-div_t/2 - 0.5, 0], [div_t/2 + 0.5, 0],
                         [div_t/2, 0.5], [-div_t/2, 0.5]]);
            // the magnetic back wall is flat, so its flare runs the full height;
            // a leaning wall carries the flare back with it above lean0
            translate([xl + div_t/2, cavB, 0])
                linear_extrude(height = mag_on ? div_top : min(div_top, lean0))
                polygon([[-div_t/2 - 0.5, 0], [div_t/2 + 0.5, 0],
                         [div_t/2, -0.5], [-div_t/2, -0.5]]);
            if (!mag_on && div_top > lean1) {
                translate([xl + div_t/2, cavB - 1, lean1]) linear_extrude(height = div_top - lean1)
                    polygon([[-div_t/2 - 0.5, 0], [div_t/2 + 0.5, 0],
                             [div_t/2, -0.5], [-div_t/2, -0.5]]);
                hull() {   // transition along the 1:4 lean
                    translate([xl + div_t/2, cavB, lean0]) linear_extrude(height = eps)
                        polygon([[-div_t/2 - 0.5, 0], [div_t/2 + 0.5, 0],
                                 [div_t/2, -0.5], [-div_t/2, -0.5]]);
                    translate([xl + div_t/2, cavB - 1, lean1]) linear_extrude(height = eps)
                        polygon([[-div_t/2 - 0.5, 0], [div_t/2 + 0.5, 0],
                                 [div_t/2, -0.5], [-div_t/2, -0.5]]);
                }
            }
        }
    }
    if (d_div) {
        // each depth divider has its back face on its division line (see depth_lines)
        for (line = depth_lines(d_ratio)) {
            yf = line - div_t;                  // front face of this divider
            translate([cavL, yf, 0]) cube([cavR - cavL, div_t, div_top]);
            translate([0, yf, 0])         divider_barX(cavL, cavR, -1);
            translate([0, yf + div_t, 0]) divider_barX(cavL, cavR, 1);
            for (xw = [cavL, cavR]) {
                dx = (xw == cavL) ? 1 : -1;
                translate([xw, yf + div_t/2, 0]) linear_extrude(height = div_top)
                    polygon([[0, -div_t/2 - 0.5], [0, div_t/2 + 0.5],
                             [dx*0.5, div_t/2], [dx*0.5, -div_t/2]]);
            }
        }
    }
    }   // union
    divider_scoops();
    }   // difference
    }   // cavity clip
}

// ---- finger scoops: cuts in the tops of the dividers. Every cut has 45-degree
// walls and removes material from the top only, so it adds no overhang. A scoop
// never reaches down into the dividers' floor fillets.
scoop_d = min(max(2, divider_scoop_mm), div_top - fil_cz);
if (!(divider_scoop == "none" || divider_scoop == "front" || divider_scoop == "center"))
    echo("WARNING: divider_scoop must be none, front or center; no scoop is cut.");

module divider_scoops() {
    cavL = -(half - wall_s); cavR = half - wall_s;
    cavB = -wall_b; cavF = F + wall_f;
    xs = divider_x();
    ys = d_div ? depth_lines(d_ratio) : [];
    side = 0.75;        // a cut reaches this far past a divider's faces, to take its 0.5 mm end flares with it
    if (divider_scoop == "front" && w_div && scoop_d >= 2) {
        // The top of each width divider slopes down toward the front wall. The
        // slope stays inside the front row: it ends 2 mm before a depth divider.
        run = len(ys) == 0 ? scoop_d : min(scoop_d, ys[0] - div_t - cavF - 2);
        if (run >= 2) for (xl = xs)
            prismX([[cavF - 1, div_top - run - 1], [cavF + run, div_top], [cavF + run, div_top + 1], [cavF - 1, div_top + 1]],
                   xl - side, xl + div_t + side);
    }
    if (divider_scoop == "center" && scoop_d >= 2) {
        // One notch in each stretch of a divider between crossings, or between a
        // crossing and a wall: a flat bottom as long as the notch is deep, under
        // 45-degree sides. A notch leaves 2 mm of full-height divider at each end
        // of its stretch, and is made shallower, or left out, where that needs it.
        y0 = concat([cavF], ys);
        y1 = concat([for (y = ys) y - div_t], [cavB]);
        if (w_div) for (xl = xs, k = [0:1:len(y0) - 1])
            let (d = min(scoop_d, (y1[k] - y0[k] - 4)/3), m = (y0[k] + y1[k])/2)
            if (d >= 2) prismX(scoop_notch(m, d), xl - side, xl + div_t + side);
        x0 = concat([cavL], [for (x = xs) x + div_t]);
        x1 = concat(xs, [cavR]);
        if (d_div) for (line = ys, k = [0:1:len(x0) - 1])
            let (d = min(scoop_d, (x1[k] - x0[k] - 4)/3), m = (x0[k] + x1[k])/2)
            if (d >= 2) prismY(scoop_notch(m, d), line - div_t - side, line + side);
    }
}
// outline of a notch d deep centred on m along a divider, against height
function scoop_notch(m, d) =
    [[m - d/2, div_top - d], [m + d/2, div_top - d], [m + 1.5*d + 1, div_top + 1], [m - 1.5*d - 1, div_top + 1]];
module divider_barX(x0, x1, dir) {
    rotate([90, 0, 90]) translate([0, 0, x0]) linear_extrude(height = x1 - x0)
        difference() {
            polygon([[0, floor_t], [dir*fil_r, floor_t], [dir*fil_r, fil_cz], [0, fil_cz]]);
            translate([dir*fil_r, fil_cz]) circle(r = fil_r);
        }
}
module divider_filletY(y0, y1, dir) {
    translate([0, y1, 0]) rotate([90, 0, 0]) linear_extrude(height = y1 - y0)
        difference() {
            polygon([[0, floor_t], [dir*fil_r, floor_t], [dir*fil_r, fil_cz], [0, fil_cz]]);
            translate([dir*fil_r, fil_cz]) circle(r = fil_r);
        }
}

// ------------------------------------------------------------------ exterior adds

// pull lip: floating plate, 45-degree wings, gussets at cell boundaries
module lip_ring2d() {
    difference() {
        polygon([[-(half - 3.272), F + 2], [half - 3.272, F + 2],
                 [half - 13.272, LIPF], [-(half - 13.272), LIPF]]);
        polygon([[-(half - 6.101), F + 2 + eps], [half - 6.101, F + 2 + eps],
                 [half - 14.101, LIPF + 2], [-(half - 14.101), LIPF + 2]]);
    }
}
module lip() {
    // plate: low profile with the 22.5-degree back slope (clipped at z = 0);
    // the wing planes also clip the plate band's outer corners
    intersection() {
        linear_extrude(height = 10) lip_ring2d();
        prismX([[LIPF - 0.2, 0], [LIPF - 0.2, 5.072], [LIPF + 0.869, 6.141],
                [LIPF + 0.869 + 6.141/0.4142, 0]],
               -half - 1, half + 1);
        below_plane([half, F, 6.772], [1, -2, 1], [1, 0, -1], [2, 1, 0]);
        scale([-1, 1, 1]) below_plane([half, F, 6.772], [1, -2, 1], [1, 0, -1], [2, 1, 0]);
    }
    // wings: their top is a single slanted plane, normal (1,-2,1)/sqrt(6),
    // through the point (half, F, 6.772) (measured on the originals)
    for (sx = [-1, 1]) scale([sx, 1, 1]) intersection() {
        linear_extrude(height = 20) lip_ring2d();
        // outboard of the finger-slot wall line (45 degrees in plan)
        translate([0, 0, -1]) linear_extrude(height = 22)
            polygon([[half - 5.101, F + 3], [half + 20, F + 3],
                     [half + 20, LIPF - 3], [half - 19.101, LIPF - 3],
                     [half - 14.101, LIPF + 2]]);
        below_plane([half, F, 6.772], [1, -2, 1], [1, 0, -1], [2, 1, 0]);
        // capped by the 45-degree plane rising from the plate's front-top edge
        below_plane([0, F, 13.272], [0, -1, 1], [1, 0, 0], [0, 1, 1]);
    }
    // gussets at internal cell boundaries: a 1.4-wide ridge band rising at
    // 45 degrees from the plate top front edge to the wall face, with
    // sqrt(2)-slope flank chamfers down to the gusset side walls
    for (b = cell_b) translate([b, 0, 0]) intersection() {
        prismX([[LIPF, 0], [LIPF, 25], [F + 2, 25], [F + 2, 0]], -1.7, 1.7);
        below_plane([0, F, 13.272], [0, -1, 1], [1, 0, 0], [0, 1, 1]);
        below_plane([0.7, F, 13.272], [1.414, -1, 1], [0, 1, 1], [-2, -1.414, 1.414]);
        below_plane([-0.7, F, 13.272], [-1.414, -1, 1], [0, 1, 1], [2, -1.414, 1.414]);
    }
}
// Half-space below the plane through p with normal n (e1, e2 span the plane).
// The box stands in for an infinite half-space, so it is sized from the model
// rather than fixed; a fixed box silently truncates features on large drawers.
bp = 2*(OW + abs(LIPF) + OH) + 200;
module below_plane(p, n, e1, e2) {
    multmatrix([[e1[0], e2[0], n[0], p[0]],
                [e1[1], e2[1], n[1], p[1]],
                [e1[2], e2[2], n[2], p[2]]])
        translate([-bp, -bp, -2*bp]) cube([2*bp, 2*bp, 2*bp]);
}

// side detent bumps on the bottom outer chamfers, near the front.
// Measured: the hull of a face trapezoid (on the plane |x| = half - 1.575)
// and a shelf trapezoid (at z = 1.575, lying on the chamfer). The originals
// carry two variants; the face bottom is 2.282 on 1-LU-tall multi-wide
// drawers and 2.565 everywhere else (see DEVIATIONS.md).
bump_zb = (H == 1 && W >= 2) ? 2.282 : 2.565;
bump_hw = 0.5 + (3.697 - bump_zb) * 0.7071;   // shelf/face top half-length
module detent_bumps() {
    for (sx = [-1, 1]) scale([sx, 1, 1]) hull() {
        // face trapezoid, thin in X (outer face exactly at half - 1.575)
        translate([half - 1.575 - hs, 0, 0]) rotate([90, 0, 90])
            linear_extrude(height = hs) polygon(
                [[F + 2.5, bump_zb], [F + 3.5, bump_zb],
                 [F + 3 + bump_hw, 3.697], [F + 3 - bump_hw, 3.697]]);
        // shelf trapezoid, thin in Z (shelf exactly at z = 1.575)
        translate([0, 0, 1.575]) linear_extrude(height = hs) polygon(
            [[half - bump_zb, F + 2.5], [half - bump_zb, F + 3.5],
             [half - 3.697, F + 3 + bump_hw], [half - 3.697, F + 3 - bump_hw]]);
    }
}

// label holder frame on the front face
module label_frame() {
    hb0 = OH - 20.9;   // hook underside chamfer start (on the wall face)
    hf0 = OH - 19.3;   // hook front face bottom
    hf1 = OH - 17.7;   // hook front face top = window bottom
    sf  = OH - 18.75;  // card slot floor
    rt  = OH - 4.9;    // rail top at the wall face (a single 45-degree chamfer from here)
    lt  = OH - 6.5;    // window ledge top
    difference() {
        union() {
            // bottom hook band, full frame width
            prismX([[F, hb0], [F - lab_p, hf0], [F - lab_p, hf1], [F - 0.8, hf1],
                    [F - 0.8, sf], [F, sf]], -lab_foot, lab_foot);
            // side rails (both layers, pre-chamfer)
            for (sx = [-1, 1]) scale([sx, 1, 1]) {
                translate([lab_chan, F - 0.8, sf]) cube([lab_foot - lab_chan, 0.8, rt - sf]);
                translate([lab_win, F - lab_p, sf]) cube([lab_foot - lab_win, lab_p - 0.8, rt - sf]);
            }
        }
        // outboard 45-degree plan chamfers
        for (sx = [-1, 1]) scale([sx, 1, 1])
            translate([0, 0, hb0 - 3]) linear_extrude(height = OH)
                polygon([[lab_foot + 1, F + 1], [lab_foot + 7, F + 1],
                         [lab_foot + 7, F - 6], [lab_foot - 6, F - 6]]);
        // Rail top chamfer: 45 degrees down toward the front, hinged at the wall face.
        // The cutter is extended along its own face line rather than offset by eps,
        // which would tilt the visible chamfer plane.
        prismX([[F + 1, rt + 1], [F - 4, rt - 4], [F - 4, rt + 8], [F + 1, rt + 8]],
               -lab_foot - 1, lab_foot + 1);
        // window ledge caps, stopping exactly on the card channel wall
        for (sx = [-1, 1]) scale([sx, 1, 1])
            translate([lab_win - eps, F - lab_p - 1, lt]) cube([lab_chan - lab_win + eps, lab_p + 1 - 0.8, OH]);
        // card channel
        translate([-lab_chan, F - 0.8, sf]) cube([2*lab_chan, 0.8 + eps, OH]);
        // window opening
        translate([-lab_win, F - lab_p - 1, hf1]) cube([2*lab_win, lab_p + 1 - 0.8 + eps, OH]);
    }
}

// ------------------------------------------------------------------ assembly

module drawer() {
    union() {
        difference() {
            union() {
                difference() {
                    union() {
                        floor_slab();
                        side_wall(1); side_wall(-1);
                        back_wall();
                        front_wall();
                    }
                    cavity();
                    scoop_cut();
                }
                corner_braces();   // lean over the cavity, so they go in after the cavity cut
                groove_bumps();    // ditto: jogged panels sit inside the cavity envelope
                side_jog_panels();
                floor_blends();
                dividers();
                lip();             // shaped by the outer edge cuts (wing roots get chamfered)
            }
            outer_edge_cuts();
            if (mag_on) magnet_pockets();
        }
        if (lab_on) label_frame();
        detent_bumps();
    }
}

drawer();
